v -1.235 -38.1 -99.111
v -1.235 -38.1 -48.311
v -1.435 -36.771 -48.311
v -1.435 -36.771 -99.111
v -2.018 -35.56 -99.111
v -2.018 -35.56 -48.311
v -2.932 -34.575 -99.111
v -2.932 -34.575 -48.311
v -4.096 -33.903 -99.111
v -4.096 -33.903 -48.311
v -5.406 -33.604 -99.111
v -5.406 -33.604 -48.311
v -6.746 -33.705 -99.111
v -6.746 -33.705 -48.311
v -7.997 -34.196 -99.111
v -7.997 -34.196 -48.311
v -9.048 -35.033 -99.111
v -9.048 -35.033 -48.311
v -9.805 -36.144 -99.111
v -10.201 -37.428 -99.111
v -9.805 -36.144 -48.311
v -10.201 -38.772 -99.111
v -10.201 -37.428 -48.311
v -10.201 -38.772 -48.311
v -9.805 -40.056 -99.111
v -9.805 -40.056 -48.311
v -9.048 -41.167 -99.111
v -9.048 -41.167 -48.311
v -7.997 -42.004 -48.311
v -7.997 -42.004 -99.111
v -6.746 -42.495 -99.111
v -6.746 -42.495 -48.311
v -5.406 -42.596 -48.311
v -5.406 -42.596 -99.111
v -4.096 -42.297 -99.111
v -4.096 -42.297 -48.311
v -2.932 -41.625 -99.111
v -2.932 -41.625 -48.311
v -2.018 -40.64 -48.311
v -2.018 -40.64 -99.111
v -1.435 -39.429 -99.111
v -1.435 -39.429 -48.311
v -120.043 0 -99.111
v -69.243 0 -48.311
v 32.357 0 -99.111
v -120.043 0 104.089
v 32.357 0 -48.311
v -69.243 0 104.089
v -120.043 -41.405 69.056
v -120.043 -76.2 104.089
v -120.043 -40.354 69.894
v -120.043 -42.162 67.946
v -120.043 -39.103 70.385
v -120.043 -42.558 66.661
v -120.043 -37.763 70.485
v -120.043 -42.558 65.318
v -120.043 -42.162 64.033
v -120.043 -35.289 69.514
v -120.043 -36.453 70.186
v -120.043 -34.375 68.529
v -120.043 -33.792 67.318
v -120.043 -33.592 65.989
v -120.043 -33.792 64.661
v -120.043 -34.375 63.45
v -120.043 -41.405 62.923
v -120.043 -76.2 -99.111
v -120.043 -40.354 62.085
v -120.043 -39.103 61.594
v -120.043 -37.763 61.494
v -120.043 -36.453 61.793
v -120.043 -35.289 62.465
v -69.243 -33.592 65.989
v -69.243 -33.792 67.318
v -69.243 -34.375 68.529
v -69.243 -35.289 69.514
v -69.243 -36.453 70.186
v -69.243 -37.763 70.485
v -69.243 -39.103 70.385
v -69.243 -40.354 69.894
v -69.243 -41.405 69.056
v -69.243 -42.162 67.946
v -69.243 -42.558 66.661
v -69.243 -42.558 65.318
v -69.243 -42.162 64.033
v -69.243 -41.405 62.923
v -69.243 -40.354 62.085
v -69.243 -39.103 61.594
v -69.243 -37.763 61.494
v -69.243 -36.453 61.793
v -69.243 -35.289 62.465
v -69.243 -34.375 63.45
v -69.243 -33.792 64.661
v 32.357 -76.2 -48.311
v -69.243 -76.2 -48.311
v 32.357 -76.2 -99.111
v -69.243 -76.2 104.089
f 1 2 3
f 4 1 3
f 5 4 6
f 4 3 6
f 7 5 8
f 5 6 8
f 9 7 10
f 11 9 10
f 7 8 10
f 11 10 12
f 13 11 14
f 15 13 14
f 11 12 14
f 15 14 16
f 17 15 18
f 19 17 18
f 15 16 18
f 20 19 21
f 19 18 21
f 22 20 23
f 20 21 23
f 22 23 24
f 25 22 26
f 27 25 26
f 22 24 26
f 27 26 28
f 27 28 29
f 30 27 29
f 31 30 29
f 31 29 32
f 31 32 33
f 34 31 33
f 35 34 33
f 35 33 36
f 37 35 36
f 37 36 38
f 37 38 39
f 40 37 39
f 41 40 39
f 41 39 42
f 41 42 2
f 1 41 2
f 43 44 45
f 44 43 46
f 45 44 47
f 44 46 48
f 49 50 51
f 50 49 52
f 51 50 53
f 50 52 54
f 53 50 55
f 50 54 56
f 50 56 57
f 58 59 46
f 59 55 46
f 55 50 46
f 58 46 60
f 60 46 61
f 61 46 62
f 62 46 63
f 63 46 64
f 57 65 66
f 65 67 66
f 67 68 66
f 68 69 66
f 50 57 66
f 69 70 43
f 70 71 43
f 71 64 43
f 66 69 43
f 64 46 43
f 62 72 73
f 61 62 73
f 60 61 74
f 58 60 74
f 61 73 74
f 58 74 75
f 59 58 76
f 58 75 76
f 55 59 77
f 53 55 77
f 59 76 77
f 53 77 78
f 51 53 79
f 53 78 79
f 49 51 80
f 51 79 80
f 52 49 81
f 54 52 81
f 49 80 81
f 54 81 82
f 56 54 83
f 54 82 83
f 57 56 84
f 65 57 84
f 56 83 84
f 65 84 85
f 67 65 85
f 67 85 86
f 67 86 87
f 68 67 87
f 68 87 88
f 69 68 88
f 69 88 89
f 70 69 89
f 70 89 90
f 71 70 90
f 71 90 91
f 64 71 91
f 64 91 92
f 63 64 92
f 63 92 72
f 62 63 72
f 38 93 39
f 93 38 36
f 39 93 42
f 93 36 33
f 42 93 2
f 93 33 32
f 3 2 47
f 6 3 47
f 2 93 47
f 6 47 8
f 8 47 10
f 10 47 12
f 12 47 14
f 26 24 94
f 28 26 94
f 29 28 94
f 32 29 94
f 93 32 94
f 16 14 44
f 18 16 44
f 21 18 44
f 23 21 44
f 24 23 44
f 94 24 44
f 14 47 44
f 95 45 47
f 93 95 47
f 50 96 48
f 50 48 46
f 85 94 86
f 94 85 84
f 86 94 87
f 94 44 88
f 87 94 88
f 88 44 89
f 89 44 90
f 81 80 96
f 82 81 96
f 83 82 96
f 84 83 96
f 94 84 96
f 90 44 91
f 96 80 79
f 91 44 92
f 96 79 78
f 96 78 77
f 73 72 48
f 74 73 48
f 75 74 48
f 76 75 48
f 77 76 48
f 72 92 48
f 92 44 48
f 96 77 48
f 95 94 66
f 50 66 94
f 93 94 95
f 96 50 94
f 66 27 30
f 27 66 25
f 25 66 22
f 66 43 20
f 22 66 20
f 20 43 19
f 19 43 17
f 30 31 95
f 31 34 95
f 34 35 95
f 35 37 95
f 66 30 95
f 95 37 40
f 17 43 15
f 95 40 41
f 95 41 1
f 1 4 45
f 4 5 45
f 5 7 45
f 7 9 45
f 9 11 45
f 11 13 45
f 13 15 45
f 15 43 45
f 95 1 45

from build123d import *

# Parameters (mm, degrees)
F1_DEPTH = 76.2
F3_R     = 4.5085
F4_DEPTH = 101.6
F2_R     = 4.5085
F5_DEPTH = 584.2


with BuildPart() as f1:
    # F0 (on Front) → F1 (new body)
    with BuildSketch(Plane.XZ):
        Polygon((-69.243231, 104.089492), (-120.043231, 104.089492), (-120.043231, -99.110508), (32.356769, -99.110508), (32.356769, -48.310508), (-69.243231, -48.310508), align=None)
    extrude(amount=F1_DEPTH)

    # F3 (on Top) → F4 (cut)
    with BuildSketch(Plane.XY):
        with Locations((-5.743231, -38.1)):
            Circle(F3_R)
    extrude(amount=-F4_DEPTH, mode=Mode.SUBTRACT)

    # F2 (on face) → F5 (cut)
    with BuildSketch(Plane.YZ.offset(-69.243231)):
        with Locations((-38.1, 65.989492)):
            Circle(F2_R)
    extrude(amount=-F5_DEPTH, mode=Mode.SUBTRACT)


solid = f1.part
